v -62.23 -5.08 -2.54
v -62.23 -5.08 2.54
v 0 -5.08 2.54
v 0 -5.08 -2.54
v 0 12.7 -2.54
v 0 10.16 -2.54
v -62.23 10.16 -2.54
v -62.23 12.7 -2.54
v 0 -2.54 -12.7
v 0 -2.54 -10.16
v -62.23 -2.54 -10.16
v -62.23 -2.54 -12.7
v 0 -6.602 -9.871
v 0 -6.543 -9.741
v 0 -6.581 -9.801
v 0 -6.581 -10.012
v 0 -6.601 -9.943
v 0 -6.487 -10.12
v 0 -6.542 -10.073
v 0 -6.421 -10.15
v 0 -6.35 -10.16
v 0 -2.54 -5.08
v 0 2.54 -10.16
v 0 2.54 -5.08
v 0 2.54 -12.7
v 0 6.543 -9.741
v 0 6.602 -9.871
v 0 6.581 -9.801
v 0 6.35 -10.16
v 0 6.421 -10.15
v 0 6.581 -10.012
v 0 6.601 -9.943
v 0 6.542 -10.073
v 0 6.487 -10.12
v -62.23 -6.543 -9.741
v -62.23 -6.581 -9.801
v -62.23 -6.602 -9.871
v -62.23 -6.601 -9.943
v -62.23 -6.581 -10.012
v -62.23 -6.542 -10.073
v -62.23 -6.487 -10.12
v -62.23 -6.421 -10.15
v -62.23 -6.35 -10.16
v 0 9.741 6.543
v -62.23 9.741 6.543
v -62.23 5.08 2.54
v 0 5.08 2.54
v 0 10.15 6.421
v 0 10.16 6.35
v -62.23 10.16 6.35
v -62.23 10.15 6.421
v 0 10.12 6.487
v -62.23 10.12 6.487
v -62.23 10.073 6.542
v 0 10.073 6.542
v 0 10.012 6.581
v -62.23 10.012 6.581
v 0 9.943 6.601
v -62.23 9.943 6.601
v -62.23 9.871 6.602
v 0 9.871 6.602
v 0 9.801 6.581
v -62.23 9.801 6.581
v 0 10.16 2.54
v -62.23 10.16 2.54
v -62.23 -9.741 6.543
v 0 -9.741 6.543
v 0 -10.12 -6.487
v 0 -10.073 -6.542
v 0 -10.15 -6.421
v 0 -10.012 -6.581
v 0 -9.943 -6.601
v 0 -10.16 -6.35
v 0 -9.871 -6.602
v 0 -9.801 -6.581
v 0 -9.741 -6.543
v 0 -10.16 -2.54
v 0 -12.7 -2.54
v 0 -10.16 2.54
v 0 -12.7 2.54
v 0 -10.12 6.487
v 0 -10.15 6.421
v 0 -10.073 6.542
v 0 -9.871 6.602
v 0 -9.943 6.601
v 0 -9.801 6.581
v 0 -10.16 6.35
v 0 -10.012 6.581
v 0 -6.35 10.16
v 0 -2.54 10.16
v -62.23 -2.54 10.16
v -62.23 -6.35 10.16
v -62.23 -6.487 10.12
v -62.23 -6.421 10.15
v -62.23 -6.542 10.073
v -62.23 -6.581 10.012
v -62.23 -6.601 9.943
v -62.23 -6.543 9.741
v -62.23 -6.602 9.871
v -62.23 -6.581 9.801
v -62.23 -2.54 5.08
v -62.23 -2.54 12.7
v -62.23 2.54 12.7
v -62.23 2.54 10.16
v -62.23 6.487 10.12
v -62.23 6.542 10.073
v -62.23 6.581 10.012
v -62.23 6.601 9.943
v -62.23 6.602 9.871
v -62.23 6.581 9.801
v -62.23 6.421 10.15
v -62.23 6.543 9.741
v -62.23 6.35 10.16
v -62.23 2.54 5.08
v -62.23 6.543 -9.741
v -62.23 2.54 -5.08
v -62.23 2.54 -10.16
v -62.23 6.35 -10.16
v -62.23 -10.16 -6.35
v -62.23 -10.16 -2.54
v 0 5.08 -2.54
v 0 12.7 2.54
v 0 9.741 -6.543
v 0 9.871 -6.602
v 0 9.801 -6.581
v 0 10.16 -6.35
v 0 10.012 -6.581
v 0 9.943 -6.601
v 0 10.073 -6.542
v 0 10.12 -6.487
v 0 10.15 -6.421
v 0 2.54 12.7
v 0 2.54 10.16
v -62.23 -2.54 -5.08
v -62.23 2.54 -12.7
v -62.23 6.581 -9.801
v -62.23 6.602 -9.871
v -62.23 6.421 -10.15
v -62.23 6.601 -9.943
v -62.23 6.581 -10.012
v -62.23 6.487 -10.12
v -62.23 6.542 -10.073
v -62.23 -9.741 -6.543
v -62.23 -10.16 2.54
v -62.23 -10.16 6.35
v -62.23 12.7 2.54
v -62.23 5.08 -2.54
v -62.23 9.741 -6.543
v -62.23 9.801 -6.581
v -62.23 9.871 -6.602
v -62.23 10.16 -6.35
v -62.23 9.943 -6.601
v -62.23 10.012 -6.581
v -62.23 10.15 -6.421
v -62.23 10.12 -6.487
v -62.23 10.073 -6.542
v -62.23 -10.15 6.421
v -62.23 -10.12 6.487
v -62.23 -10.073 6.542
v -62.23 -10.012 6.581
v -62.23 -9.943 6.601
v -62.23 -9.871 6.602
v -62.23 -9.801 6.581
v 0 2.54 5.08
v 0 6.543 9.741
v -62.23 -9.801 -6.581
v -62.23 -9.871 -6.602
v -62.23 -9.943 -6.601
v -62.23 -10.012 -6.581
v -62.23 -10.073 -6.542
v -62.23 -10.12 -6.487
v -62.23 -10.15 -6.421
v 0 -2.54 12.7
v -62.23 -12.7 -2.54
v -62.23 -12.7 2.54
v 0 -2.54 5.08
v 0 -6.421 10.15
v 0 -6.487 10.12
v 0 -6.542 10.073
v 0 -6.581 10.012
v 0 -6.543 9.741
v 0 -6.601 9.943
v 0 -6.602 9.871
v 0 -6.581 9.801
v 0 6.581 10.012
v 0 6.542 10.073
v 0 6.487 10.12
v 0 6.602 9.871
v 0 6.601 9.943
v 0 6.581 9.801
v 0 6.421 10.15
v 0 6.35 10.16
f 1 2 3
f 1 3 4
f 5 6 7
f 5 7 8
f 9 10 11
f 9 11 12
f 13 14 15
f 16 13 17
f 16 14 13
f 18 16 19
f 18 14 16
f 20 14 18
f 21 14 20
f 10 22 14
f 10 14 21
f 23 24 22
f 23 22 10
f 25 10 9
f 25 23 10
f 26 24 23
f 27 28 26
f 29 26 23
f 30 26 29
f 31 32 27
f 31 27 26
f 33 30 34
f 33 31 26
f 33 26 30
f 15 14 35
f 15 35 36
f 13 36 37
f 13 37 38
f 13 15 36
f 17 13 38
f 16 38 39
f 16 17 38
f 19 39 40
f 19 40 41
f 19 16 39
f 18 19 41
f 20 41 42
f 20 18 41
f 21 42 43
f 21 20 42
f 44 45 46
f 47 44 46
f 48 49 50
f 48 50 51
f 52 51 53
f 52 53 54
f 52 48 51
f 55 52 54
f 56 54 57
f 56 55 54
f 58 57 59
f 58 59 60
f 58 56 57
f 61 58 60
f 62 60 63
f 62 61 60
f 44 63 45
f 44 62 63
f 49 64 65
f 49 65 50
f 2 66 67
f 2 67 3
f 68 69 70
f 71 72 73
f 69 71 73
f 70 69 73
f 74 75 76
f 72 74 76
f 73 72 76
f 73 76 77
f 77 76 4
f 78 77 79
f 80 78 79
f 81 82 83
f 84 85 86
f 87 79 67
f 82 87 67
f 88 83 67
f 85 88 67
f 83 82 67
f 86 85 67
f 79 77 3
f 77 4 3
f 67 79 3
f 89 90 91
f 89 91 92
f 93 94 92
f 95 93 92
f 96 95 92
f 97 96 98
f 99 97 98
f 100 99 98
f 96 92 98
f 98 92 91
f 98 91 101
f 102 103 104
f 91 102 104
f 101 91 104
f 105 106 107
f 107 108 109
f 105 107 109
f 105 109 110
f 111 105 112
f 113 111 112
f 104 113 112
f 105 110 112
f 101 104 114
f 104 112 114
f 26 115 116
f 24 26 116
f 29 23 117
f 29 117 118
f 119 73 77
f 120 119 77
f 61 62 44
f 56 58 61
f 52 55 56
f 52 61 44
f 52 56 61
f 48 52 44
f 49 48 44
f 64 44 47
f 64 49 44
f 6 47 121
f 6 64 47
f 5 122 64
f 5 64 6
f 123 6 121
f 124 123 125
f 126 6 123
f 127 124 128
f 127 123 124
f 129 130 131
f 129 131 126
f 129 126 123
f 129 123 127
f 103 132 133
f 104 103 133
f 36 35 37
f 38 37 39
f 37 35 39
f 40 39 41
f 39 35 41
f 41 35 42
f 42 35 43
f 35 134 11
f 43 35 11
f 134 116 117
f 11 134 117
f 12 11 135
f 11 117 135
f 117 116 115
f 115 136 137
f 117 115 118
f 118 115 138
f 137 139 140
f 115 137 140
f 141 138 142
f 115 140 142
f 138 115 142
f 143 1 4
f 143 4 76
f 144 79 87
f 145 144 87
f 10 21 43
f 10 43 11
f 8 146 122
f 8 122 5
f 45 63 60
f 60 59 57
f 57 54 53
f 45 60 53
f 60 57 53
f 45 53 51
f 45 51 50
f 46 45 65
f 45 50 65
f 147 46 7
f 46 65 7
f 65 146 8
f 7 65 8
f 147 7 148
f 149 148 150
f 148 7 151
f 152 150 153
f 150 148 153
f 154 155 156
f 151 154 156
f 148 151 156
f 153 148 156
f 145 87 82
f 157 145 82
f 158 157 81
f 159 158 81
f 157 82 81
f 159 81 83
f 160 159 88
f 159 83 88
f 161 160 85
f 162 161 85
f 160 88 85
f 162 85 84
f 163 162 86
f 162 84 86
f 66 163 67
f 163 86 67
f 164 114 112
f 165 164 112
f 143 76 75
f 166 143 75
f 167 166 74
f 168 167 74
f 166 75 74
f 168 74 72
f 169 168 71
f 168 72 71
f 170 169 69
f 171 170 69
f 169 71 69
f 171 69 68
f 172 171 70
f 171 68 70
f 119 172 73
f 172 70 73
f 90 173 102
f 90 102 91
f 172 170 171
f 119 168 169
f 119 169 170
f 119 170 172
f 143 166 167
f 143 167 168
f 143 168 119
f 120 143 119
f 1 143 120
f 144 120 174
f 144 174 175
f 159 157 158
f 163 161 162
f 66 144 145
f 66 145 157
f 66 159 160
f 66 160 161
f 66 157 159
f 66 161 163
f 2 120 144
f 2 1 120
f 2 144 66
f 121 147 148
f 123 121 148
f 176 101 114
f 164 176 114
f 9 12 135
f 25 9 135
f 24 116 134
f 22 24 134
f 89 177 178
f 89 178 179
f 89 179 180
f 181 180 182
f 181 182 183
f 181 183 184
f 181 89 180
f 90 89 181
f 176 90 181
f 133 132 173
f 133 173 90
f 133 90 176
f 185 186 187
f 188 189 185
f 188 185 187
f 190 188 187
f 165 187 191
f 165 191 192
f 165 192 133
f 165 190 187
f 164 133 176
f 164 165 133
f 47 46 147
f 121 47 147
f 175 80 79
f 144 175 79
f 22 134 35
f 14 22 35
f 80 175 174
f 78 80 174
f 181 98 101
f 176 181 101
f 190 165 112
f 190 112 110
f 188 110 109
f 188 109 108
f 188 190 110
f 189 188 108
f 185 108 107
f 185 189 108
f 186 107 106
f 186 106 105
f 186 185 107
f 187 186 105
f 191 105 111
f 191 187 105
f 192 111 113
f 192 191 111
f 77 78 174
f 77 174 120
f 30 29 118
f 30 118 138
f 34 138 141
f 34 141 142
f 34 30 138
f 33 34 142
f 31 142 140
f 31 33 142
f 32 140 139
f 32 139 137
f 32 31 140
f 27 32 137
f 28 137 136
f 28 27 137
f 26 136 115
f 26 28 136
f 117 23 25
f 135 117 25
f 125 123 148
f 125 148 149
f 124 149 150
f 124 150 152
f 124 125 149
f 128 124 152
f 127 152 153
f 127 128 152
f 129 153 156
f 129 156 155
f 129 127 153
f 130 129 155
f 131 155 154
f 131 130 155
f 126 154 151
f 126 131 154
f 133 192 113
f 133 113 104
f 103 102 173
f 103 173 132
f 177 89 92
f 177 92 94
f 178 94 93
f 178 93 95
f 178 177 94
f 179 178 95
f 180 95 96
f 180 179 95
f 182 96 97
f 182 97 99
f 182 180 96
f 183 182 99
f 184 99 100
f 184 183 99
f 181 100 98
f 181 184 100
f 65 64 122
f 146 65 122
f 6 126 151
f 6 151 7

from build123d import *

# Parameters (mm, degrees)
SKETCH10_W          = 2.54
SKETCH10_H          = 5.08
SKETCH10_W_2        = 5.08
SKETCH10_H_2        = 2.54
BOSS_EXTRUDE3_DEPTH = 62.23


with BuildPart() as part:
    # Sketch10 → Boss-Extrude3 (new body)
    with BuildSketch(Plane(origin=(0, 0, 0), x_dir=(0, 0, -1), z_dir=(1, 0, 0))):
        with Locations((-11.43, 0)):
            Rectangle(SKETCH10_W, SKETCH10_H)
        with BuildLine():
            Line((-5.08, 2.54), (-9.740509205, 6.542688341))
            ThreePointArc((-9.740509205, 6.542688341), (-10.012022021, 6.580814495), (-10.16, 6.35))
            Line((-10.16, 6.35), (-10.16, -6.35))
            ThreePointArc((-10.16, -6.35), (-10.012022021, -6.580814495), (-9.740509205, -6.542688341))
            Line((-9.740509205, -6.542688341), (-5.08, -2.54))
            Line((-5.08, -2.54), (-5.08, 2.54))
        make_face()
        with BuildLine():
            Line((6.35, 10.16), (-6.35, 10.16))
            ThreePointArc((-6.35, 10.16), (-6.580814495, 10.012022021), (-6.542688341, 9.740509205))
            Line((-6.542688341, 9.740509205), (-2.54, 5.08))
            Line((-2.54, 5.08), (2.54, 5.08))
            Line((2.54, 5.08), (6.542688341, 9.740509205))
            ThreePointArc((6.542688341, 9.740509205), (6.580814495, 10.012022021), (6.35, 10.16))
        make_face()
        with Locations((0, 11.43)):
            Rectangle(SKETCH10_W_2, SKETCH10_H_2)
        with BuildLine():
            ThreePointArc((6.542688341, -9.740509205), (6.580814495, -10.012022021), (6.35, -10.16))
            Line((6.35, -10.16), (-6.35, -10.16))
            ThreePointArc((-6.35, -10.16), (-6.580814495, -10.012022021), (-6.542688341, -9.740509205))
            Line((-6.542688341, -9.740509205), (-2.54, -5.08))
            Line((-2.54, -5.08), (2.54, -5.08))
            Line((2.54, -5.08), (6.542688341, -9.740509205))
        make_face()
        with Locations((0, -11.43)):
            Rectangle(SKETCH10_W_2, SKETCH10_H_2)
        with BuildLine():
            Line((5.08, 2.54), (5.08, -2.54))
            Line((5.08, -2.54), (9.740509205, -6.542688341))
            ThreePointArc((9.740509205, -6.542688341), (10.012022021, -6.580814495), (10.16, -6.35))
            Line((10.16, -6.35), (10.16, -2.54))
            Line((10.16, -2.54), (10.16, 2.54))
            Line((10.16, 2.54), (10.16, 6.35))
            ThreePointArc((10.16, 6.35), (10.012022021, 6.580814495), (9.740509205, 6.542688341))
            Line((9.740509205, 6.542688341), (5.08, 2.54))
        make_face()
        with Locations((11.43, 0)):
            Rectangle(SKETCH10_W, SKETCH10_H)
    extrude(amount=-BOSS_EXTRUDE3_DEPTH)


solid = part.part
